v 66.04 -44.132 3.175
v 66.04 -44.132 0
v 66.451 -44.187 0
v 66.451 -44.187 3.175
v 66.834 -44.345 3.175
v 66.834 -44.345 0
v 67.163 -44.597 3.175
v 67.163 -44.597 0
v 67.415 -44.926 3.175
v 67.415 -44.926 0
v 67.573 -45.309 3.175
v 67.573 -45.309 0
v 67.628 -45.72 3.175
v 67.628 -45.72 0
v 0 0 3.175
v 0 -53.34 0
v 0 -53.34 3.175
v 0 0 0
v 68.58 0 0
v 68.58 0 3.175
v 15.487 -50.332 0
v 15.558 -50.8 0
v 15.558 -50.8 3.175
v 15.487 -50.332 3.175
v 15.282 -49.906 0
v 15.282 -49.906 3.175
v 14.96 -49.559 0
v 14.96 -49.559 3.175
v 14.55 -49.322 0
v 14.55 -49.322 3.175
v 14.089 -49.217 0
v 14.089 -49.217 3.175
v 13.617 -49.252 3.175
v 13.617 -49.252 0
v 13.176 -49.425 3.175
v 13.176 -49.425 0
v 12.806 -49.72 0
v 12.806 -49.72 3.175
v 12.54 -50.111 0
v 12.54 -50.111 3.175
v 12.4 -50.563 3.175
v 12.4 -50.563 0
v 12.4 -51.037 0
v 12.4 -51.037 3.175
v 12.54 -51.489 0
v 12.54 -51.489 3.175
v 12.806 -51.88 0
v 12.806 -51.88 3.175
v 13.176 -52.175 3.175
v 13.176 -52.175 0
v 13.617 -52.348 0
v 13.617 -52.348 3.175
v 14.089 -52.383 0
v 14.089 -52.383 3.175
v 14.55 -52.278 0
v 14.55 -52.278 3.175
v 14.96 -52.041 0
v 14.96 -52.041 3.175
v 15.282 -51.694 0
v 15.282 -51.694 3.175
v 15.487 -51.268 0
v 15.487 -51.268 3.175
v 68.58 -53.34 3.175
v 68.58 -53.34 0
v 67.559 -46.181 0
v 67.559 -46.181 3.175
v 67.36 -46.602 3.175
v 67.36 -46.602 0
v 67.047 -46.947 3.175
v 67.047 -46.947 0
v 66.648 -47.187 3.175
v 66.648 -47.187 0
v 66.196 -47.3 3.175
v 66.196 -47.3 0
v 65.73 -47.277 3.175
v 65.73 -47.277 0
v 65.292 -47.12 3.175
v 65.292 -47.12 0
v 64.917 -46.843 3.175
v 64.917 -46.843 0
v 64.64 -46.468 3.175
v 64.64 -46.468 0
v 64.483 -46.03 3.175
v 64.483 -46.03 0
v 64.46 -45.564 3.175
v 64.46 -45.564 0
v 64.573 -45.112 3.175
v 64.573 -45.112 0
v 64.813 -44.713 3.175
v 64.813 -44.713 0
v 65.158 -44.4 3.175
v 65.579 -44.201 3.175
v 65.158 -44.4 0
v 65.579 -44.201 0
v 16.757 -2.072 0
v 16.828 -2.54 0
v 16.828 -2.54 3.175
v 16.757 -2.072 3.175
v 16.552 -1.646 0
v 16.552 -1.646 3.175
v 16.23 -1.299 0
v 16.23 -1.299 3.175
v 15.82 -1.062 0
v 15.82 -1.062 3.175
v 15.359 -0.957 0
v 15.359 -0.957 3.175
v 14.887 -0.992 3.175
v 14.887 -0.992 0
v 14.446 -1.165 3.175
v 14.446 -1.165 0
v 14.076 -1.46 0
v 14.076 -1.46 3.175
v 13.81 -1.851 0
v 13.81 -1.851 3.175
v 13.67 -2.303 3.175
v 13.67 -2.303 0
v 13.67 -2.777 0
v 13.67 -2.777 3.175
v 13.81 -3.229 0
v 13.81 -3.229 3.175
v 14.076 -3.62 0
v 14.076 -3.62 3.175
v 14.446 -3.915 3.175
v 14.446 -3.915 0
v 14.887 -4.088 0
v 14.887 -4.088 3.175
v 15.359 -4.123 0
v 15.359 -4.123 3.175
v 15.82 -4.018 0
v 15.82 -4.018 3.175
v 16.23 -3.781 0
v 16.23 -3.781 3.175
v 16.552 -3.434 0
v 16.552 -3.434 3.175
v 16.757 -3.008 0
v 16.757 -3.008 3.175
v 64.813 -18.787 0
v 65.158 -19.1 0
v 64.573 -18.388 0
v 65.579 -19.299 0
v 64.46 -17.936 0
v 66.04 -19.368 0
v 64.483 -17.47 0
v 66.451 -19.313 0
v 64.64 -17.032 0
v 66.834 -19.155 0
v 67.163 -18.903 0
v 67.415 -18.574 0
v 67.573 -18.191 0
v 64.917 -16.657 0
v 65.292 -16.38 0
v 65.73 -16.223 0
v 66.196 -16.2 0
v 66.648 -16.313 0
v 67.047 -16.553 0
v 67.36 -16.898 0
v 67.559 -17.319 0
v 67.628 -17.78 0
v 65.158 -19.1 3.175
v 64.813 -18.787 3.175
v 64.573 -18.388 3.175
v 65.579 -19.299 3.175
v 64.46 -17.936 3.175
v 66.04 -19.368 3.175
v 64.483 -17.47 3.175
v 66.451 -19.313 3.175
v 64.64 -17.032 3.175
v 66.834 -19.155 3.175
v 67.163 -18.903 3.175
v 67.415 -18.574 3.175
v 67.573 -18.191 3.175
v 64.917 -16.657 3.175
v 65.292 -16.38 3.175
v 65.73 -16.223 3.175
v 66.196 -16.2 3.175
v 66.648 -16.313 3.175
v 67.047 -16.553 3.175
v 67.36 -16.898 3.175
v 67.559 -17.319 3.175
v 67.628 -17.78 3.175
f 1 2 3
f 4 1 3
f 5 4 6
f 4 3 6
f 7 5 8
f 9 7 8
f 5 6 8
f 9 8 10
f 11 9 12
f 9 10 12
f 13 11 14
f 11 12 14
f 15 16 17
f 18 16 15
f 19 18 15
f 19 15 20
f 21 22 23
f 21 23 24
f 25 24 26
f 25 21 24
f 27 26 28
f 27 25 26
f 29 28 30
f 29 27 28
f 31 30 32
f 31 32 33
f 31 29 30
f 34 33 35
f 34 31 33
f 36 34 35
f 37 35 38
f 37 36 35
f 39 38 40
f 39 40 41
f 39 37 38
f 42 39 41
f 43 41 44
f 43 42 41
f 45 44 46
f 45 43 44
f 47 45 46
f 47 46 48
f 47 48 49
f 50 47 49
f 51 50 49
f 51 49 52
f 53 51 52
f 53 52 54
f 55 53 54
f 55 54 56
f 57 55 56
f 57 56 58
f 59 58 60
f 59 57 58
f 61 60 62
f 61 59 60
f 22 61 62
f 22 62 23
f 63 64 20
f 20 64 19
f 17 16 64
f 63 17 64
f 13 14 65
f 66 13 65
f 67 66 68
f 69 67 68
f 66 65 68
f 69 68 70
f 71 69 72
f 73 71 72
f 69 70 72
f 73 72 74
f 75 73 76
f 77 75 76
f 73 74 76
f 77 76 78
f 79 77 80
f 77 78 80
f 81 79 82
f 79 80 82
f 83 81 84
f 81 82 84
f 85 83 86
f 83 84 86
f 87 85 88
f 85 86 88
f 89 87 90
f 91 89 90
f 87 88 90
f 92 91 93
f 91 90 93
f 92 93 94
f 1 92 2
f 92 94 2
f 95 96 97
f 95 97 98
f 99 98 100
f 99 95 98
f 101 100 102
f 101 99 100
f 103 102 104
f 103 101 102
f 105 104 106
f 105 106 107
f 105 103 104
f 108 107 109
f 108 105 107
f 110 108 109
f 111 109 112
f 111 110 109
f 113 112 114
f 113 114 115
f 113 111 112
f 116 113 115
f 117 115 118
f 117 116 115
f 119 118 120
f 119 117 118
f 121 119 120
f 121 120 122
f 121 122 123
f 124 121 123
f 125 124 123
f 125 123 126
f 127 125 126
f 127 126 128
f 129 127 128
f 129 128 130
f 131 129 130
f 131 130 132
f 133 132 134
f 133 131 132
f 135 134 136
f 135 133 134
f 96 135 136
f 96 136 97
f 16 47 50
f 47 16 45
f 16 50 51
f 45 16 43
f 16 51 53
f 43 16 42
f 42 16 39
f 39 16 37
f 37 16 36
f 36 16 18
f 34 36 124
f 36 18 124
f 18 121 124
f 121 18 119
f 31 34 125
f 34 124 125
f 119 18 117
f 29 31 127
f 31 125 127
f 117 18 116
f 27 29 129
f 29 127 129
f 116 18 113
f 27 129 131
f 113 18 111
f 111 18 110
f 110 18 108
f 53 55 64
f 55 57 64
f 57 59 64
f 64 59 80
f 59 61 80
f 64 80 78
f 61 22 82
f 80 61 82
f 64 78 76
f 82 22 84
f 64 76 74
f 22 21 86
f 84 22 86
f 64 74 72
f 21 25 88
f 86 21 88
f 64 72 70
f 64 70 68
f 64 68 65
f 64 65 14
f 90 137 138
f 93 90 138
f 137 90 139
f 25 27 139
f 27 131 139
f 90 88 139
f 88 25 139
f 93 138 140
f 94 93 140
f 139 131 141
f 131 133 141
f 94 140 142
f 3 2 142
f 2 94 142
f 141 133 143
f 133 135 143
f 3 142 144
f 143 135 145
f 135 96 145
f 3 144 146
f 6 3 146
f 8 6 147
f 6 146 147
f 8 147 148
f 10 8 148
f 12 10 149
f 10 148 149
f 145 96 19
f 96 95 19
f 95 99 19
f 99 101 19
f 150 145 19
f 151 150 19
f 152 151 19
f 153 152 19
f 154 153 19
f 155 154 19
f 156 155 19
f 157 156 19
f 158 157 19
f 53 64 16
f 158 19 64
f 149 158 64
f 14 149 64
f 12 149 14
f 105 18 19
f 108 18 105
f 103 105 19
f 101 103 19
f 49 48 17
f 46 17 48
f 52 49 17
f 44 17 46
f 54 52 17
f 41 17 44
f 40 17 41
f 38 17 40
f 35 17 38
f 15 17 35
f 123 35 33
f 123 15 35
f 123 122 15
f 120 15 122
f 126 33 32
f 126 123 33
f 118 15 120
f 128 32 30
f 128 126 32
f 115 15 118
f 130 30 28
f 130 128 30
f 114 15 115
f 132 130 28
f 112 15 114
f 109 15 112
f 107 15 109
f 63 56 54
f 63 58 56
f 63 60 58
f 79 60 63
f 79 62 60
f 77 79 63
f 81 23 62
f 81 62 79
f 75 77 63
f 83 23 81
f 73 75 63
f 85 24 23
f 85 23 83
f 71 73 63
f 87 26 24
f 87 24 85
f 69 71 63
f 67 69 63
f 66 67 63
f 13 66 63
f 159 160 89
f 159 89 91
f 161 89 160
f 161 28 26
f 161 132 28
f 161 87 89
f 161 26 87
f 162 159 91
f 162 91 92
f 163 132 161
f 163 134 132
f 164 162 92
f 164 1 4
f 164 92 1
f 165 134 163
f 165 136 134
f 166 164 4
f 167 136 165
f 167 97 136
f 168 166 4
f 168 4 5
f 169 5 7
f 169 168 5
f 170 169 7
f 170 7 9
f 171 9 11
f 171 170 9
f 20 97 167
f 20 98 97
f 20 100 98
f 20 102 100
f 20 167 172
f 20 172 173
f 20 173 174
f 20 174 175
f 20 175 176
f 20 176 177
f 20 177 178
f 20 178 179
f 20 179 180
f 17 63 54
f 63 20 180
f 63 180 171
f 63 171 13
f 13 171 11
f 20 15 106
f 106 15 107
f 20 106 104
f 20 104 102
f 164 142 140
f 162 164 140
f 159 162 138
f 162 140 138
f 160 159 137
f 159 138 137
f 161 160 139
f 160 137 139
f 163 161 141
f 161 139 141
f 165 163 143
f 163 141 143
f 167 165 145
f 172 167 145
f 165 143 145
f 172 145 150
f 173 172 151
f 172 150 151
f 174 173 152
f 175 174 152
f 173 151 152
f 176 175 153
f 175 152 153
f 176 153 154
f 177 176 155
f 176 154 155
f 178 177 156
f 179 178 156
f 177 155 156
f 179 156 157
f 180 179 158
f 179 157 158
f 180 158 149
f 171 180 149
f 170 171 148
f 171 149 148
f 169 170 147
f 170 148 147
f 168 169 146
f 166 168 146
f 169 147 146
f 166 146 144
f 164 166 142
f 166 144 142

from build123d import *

# Parameters (mm, degrees)
F0_W     = 68.58
F0_H     = 53.34
F0_R     = 1.5875
F1_DEPTH = 3.175


with BuildPart() as f1:
    # F0 (on Top) → F1 (new body)
    with BuildSketch(Plane.XY):
        with Locations((34.29, -26.67)):
            Rectangle(F0_W, F0_H)
        with Locations((13.97, -50.8)):
            Circle(F0_R, mode=Mode.SUBTRACT)
        with BuildLine():
            ThreePointArc((67.6275, -45.72), (64.9174679849, -46.8425320151), (66.04, -44.1325))
            ThreePointArc((66.04, -44.1325), (67.1625320151, -44.5974679849), (67.6275, -45.72))
        make_face(mode=Mode.SUBTRACT)
        with Locations((15.24, -2.54)):
            Circle(F0_R, mode=Mode.SUBTRACT)
        with BuildLine():
            ThreePointArc((67.6275, -17.78), (67.1625320151, -18.9025320151), (66.04, -19.3675))
            ThreePointArc((66.04, -19.3675), (64.9174679849, -16.6574679849), (67.6275, -17.78))
        make_face(mode=Mode.SUBTRACT)
    extrude(amount=F1_DEPTH)


solid = f1.part
